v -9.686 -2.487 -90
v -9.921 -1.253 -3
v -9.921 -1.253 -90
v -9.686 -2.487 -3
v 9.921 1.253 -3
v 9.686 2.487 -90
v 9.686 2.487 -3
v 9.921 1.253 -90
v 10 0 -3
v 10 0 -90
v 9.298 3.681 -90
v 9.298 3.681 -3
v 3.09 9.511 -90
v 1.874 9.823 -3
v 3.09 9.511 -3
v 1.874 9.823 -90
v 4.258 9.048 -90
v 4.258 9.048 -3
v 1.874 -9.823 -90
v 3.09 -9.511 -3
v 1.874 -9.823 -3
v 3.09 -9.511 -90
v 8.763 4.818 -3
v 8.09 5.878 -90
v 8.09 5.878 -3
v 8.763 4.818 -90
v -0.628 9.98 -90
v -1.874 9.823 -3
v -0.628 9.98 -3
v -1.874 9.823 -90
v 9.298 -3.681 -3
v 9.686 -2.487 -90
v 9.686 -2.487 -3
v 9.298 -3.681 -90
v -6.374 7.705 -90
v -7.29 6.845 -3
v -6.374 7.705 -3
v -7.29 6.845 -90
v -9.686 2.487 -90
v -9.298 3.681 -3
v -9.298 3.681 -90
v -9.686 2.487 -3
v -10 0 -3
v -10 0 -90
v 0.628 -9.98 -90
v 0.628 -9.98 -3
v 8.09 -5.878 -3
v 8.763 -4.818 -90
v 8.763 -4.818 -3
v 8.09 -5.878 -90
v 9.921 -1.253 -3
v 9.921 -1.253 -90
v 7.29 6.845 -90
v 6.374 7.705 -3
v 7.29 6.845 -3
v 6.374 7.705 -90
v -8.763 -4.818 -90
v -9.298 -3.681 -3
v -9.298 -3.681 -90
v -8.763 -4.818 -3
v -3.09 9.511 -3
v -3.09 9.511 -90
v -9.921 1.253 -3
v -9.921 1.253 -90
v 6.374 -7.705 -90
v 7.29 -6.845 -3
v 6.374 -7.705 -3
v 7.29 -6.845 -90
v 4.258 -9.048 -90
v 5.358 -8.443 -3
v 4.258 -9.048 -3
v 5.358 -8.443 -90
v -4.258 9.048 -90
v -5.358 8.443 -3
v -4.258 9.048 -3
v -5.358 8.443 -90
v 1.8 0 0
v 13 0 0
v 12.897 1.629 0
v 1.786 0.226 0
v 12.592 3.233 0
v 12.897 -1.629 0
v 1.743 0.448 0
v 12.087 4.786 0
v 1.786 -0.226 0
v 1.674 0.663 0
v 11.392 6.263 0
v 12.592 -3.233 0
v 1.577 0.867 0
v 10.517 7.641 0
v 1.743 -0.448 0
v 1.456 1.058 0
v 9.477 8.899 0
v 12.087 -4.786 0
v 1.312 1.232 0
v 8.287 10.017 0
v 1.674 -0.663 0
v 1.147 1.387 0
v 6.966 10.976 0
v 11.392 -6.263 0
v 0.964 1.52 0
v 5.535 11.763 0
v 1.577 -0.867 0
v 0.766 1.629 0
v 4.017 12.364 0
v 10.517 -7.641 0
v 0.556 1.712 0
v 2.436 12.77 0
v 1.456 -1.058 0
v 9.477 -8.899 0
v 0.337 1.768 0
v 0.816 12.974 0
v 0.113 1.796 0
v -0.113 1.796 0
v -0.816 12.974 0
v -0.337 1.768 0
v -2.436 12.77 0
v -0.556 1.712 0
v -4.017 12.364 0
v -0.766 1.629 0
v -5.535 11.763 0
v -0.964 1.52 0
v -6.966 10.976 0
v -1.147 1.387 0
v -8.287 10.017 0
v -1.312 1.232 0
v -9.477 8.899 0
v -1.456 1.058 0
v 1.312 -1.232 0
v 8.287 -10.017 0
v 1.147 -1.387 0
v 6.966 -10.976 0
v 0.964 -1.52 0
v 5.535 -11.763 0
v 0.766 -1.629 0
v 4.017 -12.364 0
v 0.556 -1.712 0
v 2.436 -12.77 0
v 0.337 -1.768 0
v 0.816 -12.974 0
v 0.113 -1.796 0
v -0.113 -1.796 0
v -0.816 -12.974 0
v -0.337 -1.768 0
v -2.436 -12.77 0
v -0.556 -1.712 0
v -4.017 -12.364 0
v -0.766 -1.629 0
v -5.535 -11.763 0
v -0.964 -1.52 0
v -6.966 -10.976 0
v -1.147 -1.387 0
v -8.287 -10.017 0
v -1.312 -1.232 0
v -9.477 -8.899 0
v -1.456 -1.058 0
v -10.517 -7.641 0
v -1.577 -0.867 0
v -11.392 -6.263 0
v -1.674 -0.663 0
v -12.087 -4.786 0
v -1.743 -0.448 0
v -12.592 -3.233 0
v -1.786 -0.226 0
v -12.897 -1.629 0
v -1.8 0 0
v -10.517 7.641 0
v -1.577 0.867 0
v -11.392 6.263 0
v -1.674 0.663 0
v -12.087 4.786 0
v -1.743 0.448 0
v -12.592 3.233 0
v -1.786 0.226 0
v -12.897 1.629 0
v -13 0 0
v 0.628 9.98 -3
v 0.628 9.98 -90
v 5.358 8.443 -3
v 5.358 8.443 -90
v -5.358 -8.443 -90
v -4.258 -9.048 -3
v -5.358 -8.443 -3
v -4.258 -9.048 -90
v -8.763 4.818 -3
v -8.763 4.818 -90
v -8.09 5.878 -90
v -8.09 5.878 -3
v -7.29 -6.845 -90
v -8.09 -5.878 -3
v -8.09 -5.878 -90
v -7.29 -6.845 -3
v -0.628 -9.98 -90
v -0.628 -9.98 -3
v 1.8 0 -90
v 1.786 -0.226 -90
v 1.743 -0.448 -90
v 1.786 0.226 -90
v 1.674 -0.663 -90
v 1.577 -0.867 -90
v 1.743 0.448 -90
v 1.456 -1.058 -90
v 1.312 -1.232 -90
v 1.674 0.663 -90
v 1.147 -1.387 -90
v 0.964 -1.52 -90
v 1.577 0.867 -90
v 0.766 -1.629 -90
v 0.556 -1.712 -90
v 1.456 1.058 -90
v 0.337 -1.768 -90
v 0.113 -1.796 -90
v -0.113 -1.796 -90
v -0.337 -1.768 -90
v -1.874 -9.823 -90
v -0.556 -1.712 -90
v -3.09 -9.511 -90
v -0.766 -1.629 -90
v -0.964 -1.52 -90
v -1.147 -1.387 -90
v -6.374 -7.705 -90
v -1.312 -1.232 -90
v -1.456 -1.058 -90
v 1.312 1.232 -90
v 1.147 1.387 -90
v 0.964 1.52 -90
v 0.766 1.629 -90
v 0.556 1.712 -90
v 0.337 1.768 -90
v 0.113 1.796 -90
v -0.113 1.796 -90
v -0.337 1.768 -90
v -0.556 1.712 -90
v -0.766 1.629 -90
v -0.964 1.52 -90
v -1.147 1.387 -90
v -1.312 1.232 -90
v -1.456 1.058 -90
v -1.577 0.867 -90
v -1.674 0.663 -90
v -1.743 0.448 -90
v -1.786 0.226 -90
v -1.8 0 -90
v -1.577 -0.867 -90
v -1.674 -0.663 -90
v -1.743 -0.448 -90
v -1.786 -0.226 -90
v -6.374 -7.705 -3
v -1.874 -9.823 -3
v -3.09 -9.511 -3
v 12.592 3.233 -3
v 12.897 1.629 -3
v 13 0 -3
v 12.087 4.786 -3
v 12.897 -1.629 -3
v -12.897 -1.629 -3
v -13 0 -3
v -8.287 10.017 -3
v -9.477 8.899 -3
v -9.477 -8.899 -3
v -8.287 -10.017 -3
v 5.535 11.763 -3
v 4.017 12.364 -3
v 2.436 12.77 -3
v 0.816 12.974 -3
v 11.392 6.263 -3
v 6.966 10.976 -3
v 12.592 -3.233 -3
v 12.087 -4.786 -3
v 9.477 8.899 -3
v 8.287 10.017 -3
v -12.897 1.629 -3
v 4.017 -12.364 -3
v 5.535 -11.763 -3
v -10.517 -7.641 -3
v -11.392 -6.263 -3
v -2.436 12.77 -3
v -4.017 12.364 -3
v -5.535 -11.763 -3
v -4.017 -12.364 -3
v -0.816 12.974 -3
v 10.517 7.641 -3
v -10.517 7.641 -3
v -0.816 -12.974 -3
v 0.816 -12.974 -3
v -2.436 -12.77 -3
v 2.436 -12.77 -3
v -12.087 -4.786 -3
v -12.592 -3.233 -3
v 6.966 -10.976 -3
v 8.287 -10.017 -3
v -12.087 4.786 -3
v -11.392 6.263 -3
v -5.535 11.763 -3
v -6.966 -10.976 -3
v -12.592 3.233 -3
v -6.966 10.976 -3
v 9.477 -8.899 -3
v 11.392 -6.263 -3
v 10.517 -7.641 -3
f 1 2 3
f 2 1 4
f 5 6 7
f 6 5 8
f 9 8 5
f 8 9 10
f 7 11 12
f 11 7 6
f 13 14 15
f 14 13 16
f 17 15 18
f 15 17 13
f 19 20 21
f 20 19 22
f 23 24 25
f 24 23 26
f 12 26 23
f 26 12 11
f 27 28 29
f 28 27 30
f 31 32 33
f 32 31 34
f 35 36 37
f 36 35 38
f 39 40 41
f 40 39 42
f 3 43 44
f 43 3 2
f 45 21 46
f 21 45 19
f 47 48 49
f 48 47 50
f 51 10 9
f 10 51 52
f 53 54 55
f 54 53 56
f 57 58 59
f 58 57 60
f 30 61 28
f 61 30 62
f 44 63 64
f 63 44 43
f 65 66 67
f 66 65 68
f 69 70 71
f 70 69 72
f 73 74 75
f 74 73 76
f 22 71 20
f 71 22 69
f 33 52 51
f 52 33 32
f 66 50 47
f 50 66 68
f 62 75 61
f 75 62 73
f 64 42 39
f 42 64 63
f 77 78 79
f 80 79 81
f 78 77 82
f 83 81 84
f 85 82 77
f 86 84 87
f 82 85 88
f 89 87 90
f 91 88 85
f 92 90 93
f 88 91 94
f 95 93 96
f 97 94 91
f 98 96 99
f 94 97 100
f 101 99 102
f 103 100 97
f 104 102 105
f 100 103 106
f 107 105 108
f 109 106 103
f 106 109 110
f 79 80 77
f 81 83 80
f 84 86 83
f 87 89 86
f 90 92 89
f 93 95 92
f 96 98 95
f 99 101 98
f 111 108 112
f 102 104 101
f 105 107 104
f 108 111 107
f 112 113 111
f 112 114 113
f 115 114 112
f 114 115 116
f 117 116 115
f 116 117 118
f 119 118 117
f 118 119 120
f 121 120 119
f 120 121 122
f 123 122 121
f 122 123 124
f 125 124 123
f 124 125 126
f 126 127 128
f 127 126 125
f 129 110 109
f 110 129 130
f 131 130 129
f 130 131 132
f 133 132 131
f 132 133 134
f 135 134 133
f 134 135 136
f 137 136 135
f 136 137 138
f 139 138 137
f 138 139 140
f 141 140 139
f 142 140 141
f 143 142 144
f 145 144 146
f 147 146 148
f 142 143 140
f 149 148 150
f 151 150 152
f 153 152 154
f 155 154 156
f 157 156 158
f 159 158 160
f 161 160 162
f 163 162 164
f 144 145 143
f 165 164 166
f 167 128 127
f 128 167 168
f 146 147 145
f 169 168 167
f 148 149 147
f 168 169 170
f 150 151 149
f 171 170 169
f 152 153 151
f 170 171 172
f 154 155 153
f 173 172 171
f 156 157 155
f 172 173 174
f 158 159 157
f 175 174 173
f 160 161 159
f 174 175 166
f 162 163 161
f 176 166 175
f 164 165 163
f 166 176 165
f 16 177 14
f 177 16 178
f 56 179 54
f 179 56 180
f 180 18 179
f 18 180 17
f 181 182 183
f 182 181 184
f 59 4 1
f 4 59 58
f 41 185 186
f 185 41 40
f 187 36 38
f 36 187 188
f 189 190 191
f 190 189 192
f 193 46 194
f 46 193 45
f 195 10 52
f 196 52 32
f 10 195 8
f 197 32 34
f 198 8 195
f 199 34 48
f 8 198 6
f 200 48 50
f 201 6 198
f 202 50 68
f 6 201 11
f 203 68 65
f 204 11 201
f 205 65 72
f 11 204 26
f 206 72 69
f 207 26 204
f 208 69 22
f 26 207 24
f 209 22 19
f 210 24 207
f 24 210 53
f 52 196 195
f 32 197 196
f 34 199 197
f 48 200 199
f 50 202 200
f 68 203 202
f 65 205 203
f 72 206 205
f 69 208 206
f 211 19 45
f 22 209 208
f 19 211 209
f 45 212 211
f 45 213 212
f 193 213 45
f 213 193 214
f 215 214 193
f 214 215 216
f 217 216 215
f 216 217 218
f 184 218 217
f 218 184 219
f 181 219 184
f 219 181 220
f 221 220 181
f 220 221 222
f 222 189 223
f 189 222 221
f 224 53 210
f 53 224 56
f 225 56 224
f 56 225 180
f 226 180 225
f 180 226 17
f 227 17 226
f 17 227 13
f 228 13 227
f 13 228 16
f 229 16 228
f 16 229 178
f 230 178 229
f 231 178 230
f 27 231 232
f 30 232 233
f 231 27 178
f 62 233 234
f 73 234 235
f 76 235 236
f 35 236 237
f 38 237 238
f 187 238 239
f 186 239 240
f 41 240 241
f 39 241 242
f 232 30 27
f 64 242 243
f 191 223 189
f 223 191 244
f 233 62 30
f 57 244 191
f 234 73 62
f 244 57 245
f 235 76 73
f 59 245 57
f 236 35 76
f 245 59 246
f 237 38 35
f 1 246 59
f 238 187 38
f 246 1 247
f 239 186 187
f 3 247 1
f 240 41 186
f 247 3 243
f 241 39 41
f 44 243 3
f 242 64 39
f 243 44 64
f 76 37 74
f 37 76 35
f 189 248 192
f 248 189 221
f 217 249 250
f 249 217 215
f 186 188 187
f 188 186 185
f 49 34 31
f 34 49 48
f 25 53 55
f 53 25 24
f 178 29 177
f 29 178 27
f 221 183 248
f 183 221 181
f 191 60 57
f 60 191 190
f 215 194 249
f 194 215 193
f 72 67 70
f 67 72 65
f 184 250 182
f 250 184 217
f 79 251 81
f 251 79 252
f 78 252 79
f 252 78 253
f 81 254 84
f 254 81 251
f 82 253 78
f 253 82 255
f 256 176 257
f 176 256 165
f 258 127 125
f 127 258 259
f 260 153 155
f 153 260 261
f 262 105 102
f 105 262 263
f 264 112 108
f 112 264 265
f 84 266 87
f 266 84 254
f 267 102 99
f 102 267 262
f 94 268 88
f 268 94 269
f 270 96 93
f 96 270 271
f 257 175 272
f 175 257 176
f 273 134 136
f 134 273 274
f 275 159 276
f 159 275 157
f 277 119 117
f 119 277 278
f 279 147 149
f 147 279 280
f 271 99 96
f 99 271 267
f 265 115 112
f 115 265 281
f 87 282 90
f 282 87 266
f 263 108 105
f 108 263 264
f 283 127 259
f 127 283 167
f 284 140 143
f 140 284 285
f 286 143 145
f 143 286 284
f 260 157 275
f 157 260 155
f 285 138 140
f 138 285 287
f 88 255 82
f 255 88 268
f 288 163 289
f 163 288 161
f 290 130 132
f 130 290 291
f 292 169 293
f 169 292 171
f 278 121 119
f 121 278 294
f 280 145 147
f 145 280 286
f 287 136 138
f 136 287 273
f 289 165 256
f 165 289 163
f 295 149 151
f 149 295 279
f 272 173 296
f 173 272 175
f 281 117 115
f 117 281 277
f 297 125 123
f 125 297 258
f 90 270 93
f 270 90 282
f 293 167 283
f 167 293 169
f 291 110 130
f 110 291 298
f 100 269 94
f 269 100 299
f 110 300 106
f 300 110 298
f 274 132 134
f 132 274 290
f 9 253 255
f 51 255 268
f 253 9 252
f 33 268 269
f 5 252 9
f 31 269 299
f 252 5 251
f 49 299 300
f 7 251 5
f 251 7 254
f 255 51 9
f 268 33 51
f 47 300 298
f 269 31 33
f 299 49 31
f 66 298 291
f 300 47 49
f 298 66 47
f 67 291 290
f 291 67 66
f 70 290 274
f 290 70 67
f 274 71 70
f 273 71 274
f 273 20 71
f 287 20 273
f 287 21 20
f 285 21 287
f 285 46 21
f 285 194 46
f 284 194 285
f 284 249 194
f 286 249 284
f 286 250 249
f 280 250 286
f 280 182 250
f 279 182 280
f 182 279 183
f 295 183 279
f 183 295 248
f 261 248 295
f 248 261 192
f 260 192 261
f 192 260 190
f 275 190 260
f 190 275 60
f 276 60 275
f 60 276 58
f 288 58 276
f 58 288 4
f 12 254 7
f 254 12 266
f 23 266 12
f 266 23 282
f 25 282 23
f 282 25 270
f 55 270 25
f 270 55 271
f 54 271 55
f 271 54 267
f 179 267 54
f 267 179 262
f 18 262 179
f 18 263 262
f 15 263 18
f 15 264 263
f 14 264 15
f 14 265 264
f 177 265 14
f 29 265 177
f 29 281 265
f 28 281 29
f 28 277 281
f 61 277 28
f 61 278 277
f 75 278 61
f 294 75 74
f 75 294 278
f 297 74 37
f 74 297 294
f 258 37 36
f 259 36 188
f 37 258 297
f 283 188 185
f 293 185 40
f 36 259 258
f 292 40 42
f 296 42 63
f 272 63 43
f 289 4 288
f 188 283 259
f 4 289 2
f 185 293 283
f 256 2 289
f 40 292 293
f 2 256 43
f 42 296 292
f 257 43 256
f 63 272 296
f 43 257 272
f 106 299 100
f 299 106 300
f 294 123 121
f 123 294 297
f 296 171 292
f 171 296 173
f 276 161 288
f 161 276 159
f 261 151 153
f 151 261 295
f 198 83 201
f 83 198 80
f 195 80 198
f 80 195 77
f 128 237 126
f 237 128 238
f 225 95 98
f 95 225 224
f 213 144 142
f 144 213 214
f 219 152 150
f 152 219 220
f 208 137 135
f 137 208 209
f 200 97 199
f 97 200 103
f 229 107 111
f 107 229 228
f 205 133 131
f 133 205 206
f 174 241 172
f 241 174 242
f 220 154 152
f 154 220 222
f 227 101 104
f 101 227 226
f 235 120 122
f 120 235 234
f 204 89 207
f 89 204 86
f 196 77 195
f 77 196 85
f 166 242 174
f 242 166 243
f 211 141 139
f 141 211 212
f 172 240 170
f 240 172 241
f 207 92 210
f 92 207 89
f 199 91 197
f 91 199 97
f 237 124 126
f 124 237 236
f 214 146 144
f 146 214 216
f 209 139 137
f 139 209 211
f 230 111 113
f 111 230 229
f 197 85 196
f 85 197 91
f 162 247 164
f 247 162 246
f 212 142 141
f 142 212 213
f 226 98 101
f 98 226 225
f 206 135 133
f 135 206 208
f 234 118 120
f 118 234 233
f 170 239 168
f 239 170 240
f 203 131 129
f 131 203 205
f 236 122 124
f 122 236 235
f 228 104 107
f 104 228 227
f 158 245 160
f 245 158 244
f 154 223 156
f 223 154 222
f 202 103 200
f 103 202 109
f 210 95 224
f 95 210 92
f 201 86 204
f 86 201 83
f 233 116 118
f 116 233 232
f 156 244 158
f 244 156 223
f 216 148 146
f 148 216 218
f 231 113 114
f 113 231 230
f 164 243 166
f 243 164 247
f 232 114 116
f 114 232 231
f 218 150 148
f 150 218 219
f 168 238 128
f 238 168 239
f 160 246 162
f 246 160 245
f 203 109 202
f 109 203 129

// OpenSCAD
$fn = 50;


difference() {
	union() {
		translate(v = [0, 0, -90.0000000000]) {
			cylinder(h = 90, r = 10.0000000000);
		}
		translate(v = [0, 0, -3.0000000000]) {
			cylinder(h = 3, r = 13.0000000000);
		}
	}
	union() {
		#translate(v = [0, 0, -90]) {
			cylinder(h = 90, r = 1.8000000000);
		}
	}
}
